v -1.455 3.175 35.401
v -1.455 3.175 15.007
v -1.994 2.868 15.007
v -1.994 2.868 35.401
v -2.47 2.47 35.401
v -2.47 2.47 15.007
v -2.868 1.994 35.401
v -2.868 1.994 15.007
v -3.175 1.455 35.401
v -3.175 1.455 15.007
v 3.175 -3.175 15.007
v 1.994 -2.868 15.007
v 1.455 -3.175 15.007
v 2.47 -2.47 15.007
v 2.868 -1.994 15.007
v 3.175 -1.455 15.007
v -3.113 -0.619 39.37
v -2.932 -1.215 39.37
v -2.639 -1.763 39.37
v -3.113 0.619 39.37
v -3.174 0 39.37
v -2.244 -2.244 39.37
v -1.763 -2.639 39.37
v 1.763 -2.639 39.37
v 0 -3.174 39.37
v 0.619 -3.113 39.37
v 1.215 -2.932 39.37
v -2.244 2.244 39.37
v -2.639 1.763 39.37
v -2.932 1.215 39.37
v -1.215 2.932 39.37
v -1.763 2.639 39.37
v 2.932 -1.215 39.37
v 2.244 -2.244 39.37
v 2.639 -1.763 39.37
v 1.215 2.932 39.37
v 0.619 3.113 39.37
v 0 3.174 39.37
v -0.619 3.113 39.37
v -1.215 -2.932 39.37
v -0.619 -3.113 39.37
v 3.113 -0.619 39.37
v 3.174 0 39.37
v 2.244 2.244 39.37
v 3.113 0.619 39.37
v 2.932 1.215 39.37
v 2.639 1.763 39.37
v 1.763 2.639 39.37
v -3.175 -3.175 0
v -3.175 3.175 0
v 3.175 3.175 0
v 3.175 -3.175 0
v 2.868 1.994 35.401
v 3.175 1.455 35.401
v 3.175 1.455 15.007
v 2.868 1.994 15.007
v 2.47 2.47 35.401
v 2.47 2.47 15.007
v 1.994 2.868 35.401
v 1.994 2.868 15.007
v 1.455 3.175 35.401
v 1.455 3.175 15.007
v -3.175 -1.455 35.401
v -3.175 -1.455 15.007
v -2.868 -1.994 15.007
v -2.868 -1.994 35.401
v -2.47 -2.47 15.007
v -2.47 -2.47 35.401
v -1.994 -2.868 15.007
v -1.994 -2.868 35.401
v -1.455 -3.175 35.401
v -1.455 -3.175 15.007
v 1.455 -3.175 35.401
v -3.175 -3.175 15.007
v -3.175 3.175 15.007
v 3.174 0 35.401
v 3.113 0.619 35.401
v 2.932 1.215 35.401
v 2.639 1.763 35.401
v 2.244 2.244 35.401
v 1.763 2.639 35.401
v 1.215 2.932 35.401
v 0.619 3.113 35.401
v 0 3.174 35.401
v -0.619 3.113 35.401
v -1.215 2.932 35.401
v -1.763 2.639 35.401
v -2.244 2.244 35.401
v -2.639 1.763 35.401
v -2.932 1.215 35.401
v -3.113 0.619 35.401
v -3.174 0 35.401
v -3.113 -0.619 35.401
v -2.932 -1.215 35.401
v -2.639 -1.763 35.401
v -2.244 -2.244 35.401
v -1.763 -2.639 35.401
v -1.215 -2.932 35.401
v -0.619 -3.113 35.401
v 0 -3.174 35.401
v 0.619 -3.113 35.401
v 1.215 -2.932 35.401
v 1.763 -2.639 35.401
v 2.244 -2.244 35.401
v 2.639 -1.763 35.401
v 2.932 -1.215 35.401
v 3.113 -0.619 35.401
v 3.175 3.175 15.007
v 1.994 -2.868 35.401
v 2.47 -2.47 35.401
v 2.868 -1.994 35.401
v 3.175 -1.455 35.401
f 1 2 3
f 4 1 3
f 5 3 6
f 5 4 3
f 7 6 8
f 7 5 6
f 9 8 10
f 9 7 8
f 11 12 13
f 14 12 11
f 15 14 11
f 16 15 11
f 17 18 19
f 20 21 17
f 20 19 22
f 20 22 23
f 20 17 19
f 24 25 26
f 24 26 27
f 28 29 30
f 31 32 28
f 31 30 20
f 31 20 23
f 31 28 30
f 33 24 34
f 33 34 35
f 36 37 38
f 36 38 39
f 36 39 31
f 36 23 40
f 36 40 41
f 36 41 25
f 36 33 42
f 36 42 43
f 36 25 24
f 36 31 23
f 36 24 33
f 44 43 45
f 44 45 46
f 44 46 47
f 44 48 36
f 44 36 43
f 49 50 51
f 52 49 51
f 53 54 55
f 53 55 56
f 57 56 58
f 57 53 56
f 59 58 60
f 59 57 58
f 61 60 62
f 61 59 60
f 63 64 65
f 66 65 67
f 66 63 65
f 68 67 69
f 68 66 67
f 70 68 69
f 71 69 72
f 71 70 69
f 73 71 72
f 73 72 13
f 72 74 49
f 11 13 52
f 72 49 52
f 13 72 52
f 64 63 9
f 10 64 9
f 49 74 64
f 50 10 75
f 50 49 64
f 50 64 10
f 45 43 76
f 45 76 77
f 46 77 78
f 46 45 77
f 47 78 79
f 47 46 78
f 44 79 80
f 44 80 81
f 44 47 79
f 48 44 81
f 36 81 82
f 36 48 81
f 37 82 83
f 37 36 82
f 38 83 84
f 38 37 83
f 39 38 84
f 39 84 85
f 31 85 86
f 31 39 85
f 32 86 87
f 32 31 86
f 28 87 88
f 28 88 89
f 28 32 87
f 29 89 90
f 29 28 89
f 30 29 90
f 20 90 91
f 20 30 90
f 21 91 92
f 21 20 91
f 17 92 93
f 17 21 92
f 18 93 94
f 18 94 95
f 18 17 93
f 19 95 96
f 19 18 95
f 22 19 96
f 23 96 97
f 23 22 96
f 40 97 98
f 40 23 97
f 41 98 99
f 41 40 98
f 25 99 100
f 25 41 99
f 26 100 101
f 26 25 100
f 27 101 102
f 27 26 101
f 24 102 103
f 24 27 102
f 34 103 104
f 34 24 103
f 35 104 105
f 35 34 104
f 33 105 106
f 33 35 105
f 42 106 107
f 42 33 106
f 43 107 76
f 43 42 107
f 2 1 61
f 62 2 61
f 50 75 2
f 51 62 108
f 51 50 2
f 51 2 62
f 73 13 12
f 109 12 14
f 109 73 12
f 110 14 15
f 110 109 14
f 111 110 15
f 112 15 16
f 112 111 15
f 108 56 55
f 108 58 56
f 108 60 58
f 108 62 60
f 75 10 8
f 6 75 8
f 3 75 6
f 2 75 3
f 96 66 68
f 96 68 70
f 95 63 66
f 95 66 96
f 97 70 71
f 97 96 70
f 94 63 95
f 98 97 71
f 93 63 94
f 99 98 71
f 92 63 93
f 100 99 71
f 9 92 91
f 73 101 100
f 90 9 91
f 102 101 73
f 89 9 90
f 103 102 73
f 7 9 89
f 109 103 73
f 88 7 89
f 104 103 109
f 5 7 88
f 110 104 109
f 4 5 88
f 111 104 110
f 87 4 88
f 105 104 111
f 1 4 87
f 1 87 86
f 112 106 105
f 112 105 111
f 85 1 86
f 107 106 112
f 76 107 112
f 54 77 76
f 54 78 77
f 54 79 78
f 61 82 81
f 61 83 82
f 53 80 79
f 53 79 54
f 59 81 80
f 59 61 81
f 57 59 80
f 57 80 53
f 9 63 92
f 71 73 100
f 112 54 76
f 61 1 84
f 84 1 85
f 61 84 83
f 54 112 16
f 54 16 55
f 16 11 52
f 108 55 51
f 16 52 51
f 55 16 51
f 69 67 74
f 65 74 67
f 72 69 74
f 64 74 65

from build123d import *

# Parameters (mm, degrees)
SKETCH1_W           = 6.35
SKETCH1_H           = 6.35
BOSS_EXTRUDE1_DEPTH = 39.37
SKETCH2_W           = 6.35
SKETCH2_H           = 6.35
SKETCH2_R           = 3.17373
CUT_EXTRUDE1_DEPTH  = 3.96875
SKETCH3_W           = 9.525
SKETCH3_H           = 9.525
SKETCH3_R           = 3.4925
CUT_EXTRUDE2_DEPTH  = 20.394676


with BuildPart() as part:
    # Sketch1 → Boss-Extrude1 (new body)
    with BuildSketch(Plane.XY):
        Rectangle(SKETCH1_W, SKETCH1_H)
    extrude(amount=BOSS_EXTRUDE1_DEPTH)

    # Sketch2 → Cut-Extrude1 (cut)
    with BuildSketch(Plane.XY.offset(39.37)):
        Rectangle(SKETCH2_W, SKETCH2_H)
        Circle(SKETCH2_R, mode=Mode.SUBTRACT)
    extrude(amount=-CUT_EXTRUDE1_DEPTH, mode=Mode.SUBTRACT)

    # Sketch3 → Cut-Extrude2 (cut)
    with BuildSketch(Plane.XY.offset(35.40125)):
        Rectangle(SKETCH3_W, SKETCH3_H)
        Circle(SKETCH3_R, mode=Mode.SUBTRACT)
    extrude(amount=-CUT_EXTRUDE2_DEPTH, mode=Mode.SUBTRACT)


solid = part.part
